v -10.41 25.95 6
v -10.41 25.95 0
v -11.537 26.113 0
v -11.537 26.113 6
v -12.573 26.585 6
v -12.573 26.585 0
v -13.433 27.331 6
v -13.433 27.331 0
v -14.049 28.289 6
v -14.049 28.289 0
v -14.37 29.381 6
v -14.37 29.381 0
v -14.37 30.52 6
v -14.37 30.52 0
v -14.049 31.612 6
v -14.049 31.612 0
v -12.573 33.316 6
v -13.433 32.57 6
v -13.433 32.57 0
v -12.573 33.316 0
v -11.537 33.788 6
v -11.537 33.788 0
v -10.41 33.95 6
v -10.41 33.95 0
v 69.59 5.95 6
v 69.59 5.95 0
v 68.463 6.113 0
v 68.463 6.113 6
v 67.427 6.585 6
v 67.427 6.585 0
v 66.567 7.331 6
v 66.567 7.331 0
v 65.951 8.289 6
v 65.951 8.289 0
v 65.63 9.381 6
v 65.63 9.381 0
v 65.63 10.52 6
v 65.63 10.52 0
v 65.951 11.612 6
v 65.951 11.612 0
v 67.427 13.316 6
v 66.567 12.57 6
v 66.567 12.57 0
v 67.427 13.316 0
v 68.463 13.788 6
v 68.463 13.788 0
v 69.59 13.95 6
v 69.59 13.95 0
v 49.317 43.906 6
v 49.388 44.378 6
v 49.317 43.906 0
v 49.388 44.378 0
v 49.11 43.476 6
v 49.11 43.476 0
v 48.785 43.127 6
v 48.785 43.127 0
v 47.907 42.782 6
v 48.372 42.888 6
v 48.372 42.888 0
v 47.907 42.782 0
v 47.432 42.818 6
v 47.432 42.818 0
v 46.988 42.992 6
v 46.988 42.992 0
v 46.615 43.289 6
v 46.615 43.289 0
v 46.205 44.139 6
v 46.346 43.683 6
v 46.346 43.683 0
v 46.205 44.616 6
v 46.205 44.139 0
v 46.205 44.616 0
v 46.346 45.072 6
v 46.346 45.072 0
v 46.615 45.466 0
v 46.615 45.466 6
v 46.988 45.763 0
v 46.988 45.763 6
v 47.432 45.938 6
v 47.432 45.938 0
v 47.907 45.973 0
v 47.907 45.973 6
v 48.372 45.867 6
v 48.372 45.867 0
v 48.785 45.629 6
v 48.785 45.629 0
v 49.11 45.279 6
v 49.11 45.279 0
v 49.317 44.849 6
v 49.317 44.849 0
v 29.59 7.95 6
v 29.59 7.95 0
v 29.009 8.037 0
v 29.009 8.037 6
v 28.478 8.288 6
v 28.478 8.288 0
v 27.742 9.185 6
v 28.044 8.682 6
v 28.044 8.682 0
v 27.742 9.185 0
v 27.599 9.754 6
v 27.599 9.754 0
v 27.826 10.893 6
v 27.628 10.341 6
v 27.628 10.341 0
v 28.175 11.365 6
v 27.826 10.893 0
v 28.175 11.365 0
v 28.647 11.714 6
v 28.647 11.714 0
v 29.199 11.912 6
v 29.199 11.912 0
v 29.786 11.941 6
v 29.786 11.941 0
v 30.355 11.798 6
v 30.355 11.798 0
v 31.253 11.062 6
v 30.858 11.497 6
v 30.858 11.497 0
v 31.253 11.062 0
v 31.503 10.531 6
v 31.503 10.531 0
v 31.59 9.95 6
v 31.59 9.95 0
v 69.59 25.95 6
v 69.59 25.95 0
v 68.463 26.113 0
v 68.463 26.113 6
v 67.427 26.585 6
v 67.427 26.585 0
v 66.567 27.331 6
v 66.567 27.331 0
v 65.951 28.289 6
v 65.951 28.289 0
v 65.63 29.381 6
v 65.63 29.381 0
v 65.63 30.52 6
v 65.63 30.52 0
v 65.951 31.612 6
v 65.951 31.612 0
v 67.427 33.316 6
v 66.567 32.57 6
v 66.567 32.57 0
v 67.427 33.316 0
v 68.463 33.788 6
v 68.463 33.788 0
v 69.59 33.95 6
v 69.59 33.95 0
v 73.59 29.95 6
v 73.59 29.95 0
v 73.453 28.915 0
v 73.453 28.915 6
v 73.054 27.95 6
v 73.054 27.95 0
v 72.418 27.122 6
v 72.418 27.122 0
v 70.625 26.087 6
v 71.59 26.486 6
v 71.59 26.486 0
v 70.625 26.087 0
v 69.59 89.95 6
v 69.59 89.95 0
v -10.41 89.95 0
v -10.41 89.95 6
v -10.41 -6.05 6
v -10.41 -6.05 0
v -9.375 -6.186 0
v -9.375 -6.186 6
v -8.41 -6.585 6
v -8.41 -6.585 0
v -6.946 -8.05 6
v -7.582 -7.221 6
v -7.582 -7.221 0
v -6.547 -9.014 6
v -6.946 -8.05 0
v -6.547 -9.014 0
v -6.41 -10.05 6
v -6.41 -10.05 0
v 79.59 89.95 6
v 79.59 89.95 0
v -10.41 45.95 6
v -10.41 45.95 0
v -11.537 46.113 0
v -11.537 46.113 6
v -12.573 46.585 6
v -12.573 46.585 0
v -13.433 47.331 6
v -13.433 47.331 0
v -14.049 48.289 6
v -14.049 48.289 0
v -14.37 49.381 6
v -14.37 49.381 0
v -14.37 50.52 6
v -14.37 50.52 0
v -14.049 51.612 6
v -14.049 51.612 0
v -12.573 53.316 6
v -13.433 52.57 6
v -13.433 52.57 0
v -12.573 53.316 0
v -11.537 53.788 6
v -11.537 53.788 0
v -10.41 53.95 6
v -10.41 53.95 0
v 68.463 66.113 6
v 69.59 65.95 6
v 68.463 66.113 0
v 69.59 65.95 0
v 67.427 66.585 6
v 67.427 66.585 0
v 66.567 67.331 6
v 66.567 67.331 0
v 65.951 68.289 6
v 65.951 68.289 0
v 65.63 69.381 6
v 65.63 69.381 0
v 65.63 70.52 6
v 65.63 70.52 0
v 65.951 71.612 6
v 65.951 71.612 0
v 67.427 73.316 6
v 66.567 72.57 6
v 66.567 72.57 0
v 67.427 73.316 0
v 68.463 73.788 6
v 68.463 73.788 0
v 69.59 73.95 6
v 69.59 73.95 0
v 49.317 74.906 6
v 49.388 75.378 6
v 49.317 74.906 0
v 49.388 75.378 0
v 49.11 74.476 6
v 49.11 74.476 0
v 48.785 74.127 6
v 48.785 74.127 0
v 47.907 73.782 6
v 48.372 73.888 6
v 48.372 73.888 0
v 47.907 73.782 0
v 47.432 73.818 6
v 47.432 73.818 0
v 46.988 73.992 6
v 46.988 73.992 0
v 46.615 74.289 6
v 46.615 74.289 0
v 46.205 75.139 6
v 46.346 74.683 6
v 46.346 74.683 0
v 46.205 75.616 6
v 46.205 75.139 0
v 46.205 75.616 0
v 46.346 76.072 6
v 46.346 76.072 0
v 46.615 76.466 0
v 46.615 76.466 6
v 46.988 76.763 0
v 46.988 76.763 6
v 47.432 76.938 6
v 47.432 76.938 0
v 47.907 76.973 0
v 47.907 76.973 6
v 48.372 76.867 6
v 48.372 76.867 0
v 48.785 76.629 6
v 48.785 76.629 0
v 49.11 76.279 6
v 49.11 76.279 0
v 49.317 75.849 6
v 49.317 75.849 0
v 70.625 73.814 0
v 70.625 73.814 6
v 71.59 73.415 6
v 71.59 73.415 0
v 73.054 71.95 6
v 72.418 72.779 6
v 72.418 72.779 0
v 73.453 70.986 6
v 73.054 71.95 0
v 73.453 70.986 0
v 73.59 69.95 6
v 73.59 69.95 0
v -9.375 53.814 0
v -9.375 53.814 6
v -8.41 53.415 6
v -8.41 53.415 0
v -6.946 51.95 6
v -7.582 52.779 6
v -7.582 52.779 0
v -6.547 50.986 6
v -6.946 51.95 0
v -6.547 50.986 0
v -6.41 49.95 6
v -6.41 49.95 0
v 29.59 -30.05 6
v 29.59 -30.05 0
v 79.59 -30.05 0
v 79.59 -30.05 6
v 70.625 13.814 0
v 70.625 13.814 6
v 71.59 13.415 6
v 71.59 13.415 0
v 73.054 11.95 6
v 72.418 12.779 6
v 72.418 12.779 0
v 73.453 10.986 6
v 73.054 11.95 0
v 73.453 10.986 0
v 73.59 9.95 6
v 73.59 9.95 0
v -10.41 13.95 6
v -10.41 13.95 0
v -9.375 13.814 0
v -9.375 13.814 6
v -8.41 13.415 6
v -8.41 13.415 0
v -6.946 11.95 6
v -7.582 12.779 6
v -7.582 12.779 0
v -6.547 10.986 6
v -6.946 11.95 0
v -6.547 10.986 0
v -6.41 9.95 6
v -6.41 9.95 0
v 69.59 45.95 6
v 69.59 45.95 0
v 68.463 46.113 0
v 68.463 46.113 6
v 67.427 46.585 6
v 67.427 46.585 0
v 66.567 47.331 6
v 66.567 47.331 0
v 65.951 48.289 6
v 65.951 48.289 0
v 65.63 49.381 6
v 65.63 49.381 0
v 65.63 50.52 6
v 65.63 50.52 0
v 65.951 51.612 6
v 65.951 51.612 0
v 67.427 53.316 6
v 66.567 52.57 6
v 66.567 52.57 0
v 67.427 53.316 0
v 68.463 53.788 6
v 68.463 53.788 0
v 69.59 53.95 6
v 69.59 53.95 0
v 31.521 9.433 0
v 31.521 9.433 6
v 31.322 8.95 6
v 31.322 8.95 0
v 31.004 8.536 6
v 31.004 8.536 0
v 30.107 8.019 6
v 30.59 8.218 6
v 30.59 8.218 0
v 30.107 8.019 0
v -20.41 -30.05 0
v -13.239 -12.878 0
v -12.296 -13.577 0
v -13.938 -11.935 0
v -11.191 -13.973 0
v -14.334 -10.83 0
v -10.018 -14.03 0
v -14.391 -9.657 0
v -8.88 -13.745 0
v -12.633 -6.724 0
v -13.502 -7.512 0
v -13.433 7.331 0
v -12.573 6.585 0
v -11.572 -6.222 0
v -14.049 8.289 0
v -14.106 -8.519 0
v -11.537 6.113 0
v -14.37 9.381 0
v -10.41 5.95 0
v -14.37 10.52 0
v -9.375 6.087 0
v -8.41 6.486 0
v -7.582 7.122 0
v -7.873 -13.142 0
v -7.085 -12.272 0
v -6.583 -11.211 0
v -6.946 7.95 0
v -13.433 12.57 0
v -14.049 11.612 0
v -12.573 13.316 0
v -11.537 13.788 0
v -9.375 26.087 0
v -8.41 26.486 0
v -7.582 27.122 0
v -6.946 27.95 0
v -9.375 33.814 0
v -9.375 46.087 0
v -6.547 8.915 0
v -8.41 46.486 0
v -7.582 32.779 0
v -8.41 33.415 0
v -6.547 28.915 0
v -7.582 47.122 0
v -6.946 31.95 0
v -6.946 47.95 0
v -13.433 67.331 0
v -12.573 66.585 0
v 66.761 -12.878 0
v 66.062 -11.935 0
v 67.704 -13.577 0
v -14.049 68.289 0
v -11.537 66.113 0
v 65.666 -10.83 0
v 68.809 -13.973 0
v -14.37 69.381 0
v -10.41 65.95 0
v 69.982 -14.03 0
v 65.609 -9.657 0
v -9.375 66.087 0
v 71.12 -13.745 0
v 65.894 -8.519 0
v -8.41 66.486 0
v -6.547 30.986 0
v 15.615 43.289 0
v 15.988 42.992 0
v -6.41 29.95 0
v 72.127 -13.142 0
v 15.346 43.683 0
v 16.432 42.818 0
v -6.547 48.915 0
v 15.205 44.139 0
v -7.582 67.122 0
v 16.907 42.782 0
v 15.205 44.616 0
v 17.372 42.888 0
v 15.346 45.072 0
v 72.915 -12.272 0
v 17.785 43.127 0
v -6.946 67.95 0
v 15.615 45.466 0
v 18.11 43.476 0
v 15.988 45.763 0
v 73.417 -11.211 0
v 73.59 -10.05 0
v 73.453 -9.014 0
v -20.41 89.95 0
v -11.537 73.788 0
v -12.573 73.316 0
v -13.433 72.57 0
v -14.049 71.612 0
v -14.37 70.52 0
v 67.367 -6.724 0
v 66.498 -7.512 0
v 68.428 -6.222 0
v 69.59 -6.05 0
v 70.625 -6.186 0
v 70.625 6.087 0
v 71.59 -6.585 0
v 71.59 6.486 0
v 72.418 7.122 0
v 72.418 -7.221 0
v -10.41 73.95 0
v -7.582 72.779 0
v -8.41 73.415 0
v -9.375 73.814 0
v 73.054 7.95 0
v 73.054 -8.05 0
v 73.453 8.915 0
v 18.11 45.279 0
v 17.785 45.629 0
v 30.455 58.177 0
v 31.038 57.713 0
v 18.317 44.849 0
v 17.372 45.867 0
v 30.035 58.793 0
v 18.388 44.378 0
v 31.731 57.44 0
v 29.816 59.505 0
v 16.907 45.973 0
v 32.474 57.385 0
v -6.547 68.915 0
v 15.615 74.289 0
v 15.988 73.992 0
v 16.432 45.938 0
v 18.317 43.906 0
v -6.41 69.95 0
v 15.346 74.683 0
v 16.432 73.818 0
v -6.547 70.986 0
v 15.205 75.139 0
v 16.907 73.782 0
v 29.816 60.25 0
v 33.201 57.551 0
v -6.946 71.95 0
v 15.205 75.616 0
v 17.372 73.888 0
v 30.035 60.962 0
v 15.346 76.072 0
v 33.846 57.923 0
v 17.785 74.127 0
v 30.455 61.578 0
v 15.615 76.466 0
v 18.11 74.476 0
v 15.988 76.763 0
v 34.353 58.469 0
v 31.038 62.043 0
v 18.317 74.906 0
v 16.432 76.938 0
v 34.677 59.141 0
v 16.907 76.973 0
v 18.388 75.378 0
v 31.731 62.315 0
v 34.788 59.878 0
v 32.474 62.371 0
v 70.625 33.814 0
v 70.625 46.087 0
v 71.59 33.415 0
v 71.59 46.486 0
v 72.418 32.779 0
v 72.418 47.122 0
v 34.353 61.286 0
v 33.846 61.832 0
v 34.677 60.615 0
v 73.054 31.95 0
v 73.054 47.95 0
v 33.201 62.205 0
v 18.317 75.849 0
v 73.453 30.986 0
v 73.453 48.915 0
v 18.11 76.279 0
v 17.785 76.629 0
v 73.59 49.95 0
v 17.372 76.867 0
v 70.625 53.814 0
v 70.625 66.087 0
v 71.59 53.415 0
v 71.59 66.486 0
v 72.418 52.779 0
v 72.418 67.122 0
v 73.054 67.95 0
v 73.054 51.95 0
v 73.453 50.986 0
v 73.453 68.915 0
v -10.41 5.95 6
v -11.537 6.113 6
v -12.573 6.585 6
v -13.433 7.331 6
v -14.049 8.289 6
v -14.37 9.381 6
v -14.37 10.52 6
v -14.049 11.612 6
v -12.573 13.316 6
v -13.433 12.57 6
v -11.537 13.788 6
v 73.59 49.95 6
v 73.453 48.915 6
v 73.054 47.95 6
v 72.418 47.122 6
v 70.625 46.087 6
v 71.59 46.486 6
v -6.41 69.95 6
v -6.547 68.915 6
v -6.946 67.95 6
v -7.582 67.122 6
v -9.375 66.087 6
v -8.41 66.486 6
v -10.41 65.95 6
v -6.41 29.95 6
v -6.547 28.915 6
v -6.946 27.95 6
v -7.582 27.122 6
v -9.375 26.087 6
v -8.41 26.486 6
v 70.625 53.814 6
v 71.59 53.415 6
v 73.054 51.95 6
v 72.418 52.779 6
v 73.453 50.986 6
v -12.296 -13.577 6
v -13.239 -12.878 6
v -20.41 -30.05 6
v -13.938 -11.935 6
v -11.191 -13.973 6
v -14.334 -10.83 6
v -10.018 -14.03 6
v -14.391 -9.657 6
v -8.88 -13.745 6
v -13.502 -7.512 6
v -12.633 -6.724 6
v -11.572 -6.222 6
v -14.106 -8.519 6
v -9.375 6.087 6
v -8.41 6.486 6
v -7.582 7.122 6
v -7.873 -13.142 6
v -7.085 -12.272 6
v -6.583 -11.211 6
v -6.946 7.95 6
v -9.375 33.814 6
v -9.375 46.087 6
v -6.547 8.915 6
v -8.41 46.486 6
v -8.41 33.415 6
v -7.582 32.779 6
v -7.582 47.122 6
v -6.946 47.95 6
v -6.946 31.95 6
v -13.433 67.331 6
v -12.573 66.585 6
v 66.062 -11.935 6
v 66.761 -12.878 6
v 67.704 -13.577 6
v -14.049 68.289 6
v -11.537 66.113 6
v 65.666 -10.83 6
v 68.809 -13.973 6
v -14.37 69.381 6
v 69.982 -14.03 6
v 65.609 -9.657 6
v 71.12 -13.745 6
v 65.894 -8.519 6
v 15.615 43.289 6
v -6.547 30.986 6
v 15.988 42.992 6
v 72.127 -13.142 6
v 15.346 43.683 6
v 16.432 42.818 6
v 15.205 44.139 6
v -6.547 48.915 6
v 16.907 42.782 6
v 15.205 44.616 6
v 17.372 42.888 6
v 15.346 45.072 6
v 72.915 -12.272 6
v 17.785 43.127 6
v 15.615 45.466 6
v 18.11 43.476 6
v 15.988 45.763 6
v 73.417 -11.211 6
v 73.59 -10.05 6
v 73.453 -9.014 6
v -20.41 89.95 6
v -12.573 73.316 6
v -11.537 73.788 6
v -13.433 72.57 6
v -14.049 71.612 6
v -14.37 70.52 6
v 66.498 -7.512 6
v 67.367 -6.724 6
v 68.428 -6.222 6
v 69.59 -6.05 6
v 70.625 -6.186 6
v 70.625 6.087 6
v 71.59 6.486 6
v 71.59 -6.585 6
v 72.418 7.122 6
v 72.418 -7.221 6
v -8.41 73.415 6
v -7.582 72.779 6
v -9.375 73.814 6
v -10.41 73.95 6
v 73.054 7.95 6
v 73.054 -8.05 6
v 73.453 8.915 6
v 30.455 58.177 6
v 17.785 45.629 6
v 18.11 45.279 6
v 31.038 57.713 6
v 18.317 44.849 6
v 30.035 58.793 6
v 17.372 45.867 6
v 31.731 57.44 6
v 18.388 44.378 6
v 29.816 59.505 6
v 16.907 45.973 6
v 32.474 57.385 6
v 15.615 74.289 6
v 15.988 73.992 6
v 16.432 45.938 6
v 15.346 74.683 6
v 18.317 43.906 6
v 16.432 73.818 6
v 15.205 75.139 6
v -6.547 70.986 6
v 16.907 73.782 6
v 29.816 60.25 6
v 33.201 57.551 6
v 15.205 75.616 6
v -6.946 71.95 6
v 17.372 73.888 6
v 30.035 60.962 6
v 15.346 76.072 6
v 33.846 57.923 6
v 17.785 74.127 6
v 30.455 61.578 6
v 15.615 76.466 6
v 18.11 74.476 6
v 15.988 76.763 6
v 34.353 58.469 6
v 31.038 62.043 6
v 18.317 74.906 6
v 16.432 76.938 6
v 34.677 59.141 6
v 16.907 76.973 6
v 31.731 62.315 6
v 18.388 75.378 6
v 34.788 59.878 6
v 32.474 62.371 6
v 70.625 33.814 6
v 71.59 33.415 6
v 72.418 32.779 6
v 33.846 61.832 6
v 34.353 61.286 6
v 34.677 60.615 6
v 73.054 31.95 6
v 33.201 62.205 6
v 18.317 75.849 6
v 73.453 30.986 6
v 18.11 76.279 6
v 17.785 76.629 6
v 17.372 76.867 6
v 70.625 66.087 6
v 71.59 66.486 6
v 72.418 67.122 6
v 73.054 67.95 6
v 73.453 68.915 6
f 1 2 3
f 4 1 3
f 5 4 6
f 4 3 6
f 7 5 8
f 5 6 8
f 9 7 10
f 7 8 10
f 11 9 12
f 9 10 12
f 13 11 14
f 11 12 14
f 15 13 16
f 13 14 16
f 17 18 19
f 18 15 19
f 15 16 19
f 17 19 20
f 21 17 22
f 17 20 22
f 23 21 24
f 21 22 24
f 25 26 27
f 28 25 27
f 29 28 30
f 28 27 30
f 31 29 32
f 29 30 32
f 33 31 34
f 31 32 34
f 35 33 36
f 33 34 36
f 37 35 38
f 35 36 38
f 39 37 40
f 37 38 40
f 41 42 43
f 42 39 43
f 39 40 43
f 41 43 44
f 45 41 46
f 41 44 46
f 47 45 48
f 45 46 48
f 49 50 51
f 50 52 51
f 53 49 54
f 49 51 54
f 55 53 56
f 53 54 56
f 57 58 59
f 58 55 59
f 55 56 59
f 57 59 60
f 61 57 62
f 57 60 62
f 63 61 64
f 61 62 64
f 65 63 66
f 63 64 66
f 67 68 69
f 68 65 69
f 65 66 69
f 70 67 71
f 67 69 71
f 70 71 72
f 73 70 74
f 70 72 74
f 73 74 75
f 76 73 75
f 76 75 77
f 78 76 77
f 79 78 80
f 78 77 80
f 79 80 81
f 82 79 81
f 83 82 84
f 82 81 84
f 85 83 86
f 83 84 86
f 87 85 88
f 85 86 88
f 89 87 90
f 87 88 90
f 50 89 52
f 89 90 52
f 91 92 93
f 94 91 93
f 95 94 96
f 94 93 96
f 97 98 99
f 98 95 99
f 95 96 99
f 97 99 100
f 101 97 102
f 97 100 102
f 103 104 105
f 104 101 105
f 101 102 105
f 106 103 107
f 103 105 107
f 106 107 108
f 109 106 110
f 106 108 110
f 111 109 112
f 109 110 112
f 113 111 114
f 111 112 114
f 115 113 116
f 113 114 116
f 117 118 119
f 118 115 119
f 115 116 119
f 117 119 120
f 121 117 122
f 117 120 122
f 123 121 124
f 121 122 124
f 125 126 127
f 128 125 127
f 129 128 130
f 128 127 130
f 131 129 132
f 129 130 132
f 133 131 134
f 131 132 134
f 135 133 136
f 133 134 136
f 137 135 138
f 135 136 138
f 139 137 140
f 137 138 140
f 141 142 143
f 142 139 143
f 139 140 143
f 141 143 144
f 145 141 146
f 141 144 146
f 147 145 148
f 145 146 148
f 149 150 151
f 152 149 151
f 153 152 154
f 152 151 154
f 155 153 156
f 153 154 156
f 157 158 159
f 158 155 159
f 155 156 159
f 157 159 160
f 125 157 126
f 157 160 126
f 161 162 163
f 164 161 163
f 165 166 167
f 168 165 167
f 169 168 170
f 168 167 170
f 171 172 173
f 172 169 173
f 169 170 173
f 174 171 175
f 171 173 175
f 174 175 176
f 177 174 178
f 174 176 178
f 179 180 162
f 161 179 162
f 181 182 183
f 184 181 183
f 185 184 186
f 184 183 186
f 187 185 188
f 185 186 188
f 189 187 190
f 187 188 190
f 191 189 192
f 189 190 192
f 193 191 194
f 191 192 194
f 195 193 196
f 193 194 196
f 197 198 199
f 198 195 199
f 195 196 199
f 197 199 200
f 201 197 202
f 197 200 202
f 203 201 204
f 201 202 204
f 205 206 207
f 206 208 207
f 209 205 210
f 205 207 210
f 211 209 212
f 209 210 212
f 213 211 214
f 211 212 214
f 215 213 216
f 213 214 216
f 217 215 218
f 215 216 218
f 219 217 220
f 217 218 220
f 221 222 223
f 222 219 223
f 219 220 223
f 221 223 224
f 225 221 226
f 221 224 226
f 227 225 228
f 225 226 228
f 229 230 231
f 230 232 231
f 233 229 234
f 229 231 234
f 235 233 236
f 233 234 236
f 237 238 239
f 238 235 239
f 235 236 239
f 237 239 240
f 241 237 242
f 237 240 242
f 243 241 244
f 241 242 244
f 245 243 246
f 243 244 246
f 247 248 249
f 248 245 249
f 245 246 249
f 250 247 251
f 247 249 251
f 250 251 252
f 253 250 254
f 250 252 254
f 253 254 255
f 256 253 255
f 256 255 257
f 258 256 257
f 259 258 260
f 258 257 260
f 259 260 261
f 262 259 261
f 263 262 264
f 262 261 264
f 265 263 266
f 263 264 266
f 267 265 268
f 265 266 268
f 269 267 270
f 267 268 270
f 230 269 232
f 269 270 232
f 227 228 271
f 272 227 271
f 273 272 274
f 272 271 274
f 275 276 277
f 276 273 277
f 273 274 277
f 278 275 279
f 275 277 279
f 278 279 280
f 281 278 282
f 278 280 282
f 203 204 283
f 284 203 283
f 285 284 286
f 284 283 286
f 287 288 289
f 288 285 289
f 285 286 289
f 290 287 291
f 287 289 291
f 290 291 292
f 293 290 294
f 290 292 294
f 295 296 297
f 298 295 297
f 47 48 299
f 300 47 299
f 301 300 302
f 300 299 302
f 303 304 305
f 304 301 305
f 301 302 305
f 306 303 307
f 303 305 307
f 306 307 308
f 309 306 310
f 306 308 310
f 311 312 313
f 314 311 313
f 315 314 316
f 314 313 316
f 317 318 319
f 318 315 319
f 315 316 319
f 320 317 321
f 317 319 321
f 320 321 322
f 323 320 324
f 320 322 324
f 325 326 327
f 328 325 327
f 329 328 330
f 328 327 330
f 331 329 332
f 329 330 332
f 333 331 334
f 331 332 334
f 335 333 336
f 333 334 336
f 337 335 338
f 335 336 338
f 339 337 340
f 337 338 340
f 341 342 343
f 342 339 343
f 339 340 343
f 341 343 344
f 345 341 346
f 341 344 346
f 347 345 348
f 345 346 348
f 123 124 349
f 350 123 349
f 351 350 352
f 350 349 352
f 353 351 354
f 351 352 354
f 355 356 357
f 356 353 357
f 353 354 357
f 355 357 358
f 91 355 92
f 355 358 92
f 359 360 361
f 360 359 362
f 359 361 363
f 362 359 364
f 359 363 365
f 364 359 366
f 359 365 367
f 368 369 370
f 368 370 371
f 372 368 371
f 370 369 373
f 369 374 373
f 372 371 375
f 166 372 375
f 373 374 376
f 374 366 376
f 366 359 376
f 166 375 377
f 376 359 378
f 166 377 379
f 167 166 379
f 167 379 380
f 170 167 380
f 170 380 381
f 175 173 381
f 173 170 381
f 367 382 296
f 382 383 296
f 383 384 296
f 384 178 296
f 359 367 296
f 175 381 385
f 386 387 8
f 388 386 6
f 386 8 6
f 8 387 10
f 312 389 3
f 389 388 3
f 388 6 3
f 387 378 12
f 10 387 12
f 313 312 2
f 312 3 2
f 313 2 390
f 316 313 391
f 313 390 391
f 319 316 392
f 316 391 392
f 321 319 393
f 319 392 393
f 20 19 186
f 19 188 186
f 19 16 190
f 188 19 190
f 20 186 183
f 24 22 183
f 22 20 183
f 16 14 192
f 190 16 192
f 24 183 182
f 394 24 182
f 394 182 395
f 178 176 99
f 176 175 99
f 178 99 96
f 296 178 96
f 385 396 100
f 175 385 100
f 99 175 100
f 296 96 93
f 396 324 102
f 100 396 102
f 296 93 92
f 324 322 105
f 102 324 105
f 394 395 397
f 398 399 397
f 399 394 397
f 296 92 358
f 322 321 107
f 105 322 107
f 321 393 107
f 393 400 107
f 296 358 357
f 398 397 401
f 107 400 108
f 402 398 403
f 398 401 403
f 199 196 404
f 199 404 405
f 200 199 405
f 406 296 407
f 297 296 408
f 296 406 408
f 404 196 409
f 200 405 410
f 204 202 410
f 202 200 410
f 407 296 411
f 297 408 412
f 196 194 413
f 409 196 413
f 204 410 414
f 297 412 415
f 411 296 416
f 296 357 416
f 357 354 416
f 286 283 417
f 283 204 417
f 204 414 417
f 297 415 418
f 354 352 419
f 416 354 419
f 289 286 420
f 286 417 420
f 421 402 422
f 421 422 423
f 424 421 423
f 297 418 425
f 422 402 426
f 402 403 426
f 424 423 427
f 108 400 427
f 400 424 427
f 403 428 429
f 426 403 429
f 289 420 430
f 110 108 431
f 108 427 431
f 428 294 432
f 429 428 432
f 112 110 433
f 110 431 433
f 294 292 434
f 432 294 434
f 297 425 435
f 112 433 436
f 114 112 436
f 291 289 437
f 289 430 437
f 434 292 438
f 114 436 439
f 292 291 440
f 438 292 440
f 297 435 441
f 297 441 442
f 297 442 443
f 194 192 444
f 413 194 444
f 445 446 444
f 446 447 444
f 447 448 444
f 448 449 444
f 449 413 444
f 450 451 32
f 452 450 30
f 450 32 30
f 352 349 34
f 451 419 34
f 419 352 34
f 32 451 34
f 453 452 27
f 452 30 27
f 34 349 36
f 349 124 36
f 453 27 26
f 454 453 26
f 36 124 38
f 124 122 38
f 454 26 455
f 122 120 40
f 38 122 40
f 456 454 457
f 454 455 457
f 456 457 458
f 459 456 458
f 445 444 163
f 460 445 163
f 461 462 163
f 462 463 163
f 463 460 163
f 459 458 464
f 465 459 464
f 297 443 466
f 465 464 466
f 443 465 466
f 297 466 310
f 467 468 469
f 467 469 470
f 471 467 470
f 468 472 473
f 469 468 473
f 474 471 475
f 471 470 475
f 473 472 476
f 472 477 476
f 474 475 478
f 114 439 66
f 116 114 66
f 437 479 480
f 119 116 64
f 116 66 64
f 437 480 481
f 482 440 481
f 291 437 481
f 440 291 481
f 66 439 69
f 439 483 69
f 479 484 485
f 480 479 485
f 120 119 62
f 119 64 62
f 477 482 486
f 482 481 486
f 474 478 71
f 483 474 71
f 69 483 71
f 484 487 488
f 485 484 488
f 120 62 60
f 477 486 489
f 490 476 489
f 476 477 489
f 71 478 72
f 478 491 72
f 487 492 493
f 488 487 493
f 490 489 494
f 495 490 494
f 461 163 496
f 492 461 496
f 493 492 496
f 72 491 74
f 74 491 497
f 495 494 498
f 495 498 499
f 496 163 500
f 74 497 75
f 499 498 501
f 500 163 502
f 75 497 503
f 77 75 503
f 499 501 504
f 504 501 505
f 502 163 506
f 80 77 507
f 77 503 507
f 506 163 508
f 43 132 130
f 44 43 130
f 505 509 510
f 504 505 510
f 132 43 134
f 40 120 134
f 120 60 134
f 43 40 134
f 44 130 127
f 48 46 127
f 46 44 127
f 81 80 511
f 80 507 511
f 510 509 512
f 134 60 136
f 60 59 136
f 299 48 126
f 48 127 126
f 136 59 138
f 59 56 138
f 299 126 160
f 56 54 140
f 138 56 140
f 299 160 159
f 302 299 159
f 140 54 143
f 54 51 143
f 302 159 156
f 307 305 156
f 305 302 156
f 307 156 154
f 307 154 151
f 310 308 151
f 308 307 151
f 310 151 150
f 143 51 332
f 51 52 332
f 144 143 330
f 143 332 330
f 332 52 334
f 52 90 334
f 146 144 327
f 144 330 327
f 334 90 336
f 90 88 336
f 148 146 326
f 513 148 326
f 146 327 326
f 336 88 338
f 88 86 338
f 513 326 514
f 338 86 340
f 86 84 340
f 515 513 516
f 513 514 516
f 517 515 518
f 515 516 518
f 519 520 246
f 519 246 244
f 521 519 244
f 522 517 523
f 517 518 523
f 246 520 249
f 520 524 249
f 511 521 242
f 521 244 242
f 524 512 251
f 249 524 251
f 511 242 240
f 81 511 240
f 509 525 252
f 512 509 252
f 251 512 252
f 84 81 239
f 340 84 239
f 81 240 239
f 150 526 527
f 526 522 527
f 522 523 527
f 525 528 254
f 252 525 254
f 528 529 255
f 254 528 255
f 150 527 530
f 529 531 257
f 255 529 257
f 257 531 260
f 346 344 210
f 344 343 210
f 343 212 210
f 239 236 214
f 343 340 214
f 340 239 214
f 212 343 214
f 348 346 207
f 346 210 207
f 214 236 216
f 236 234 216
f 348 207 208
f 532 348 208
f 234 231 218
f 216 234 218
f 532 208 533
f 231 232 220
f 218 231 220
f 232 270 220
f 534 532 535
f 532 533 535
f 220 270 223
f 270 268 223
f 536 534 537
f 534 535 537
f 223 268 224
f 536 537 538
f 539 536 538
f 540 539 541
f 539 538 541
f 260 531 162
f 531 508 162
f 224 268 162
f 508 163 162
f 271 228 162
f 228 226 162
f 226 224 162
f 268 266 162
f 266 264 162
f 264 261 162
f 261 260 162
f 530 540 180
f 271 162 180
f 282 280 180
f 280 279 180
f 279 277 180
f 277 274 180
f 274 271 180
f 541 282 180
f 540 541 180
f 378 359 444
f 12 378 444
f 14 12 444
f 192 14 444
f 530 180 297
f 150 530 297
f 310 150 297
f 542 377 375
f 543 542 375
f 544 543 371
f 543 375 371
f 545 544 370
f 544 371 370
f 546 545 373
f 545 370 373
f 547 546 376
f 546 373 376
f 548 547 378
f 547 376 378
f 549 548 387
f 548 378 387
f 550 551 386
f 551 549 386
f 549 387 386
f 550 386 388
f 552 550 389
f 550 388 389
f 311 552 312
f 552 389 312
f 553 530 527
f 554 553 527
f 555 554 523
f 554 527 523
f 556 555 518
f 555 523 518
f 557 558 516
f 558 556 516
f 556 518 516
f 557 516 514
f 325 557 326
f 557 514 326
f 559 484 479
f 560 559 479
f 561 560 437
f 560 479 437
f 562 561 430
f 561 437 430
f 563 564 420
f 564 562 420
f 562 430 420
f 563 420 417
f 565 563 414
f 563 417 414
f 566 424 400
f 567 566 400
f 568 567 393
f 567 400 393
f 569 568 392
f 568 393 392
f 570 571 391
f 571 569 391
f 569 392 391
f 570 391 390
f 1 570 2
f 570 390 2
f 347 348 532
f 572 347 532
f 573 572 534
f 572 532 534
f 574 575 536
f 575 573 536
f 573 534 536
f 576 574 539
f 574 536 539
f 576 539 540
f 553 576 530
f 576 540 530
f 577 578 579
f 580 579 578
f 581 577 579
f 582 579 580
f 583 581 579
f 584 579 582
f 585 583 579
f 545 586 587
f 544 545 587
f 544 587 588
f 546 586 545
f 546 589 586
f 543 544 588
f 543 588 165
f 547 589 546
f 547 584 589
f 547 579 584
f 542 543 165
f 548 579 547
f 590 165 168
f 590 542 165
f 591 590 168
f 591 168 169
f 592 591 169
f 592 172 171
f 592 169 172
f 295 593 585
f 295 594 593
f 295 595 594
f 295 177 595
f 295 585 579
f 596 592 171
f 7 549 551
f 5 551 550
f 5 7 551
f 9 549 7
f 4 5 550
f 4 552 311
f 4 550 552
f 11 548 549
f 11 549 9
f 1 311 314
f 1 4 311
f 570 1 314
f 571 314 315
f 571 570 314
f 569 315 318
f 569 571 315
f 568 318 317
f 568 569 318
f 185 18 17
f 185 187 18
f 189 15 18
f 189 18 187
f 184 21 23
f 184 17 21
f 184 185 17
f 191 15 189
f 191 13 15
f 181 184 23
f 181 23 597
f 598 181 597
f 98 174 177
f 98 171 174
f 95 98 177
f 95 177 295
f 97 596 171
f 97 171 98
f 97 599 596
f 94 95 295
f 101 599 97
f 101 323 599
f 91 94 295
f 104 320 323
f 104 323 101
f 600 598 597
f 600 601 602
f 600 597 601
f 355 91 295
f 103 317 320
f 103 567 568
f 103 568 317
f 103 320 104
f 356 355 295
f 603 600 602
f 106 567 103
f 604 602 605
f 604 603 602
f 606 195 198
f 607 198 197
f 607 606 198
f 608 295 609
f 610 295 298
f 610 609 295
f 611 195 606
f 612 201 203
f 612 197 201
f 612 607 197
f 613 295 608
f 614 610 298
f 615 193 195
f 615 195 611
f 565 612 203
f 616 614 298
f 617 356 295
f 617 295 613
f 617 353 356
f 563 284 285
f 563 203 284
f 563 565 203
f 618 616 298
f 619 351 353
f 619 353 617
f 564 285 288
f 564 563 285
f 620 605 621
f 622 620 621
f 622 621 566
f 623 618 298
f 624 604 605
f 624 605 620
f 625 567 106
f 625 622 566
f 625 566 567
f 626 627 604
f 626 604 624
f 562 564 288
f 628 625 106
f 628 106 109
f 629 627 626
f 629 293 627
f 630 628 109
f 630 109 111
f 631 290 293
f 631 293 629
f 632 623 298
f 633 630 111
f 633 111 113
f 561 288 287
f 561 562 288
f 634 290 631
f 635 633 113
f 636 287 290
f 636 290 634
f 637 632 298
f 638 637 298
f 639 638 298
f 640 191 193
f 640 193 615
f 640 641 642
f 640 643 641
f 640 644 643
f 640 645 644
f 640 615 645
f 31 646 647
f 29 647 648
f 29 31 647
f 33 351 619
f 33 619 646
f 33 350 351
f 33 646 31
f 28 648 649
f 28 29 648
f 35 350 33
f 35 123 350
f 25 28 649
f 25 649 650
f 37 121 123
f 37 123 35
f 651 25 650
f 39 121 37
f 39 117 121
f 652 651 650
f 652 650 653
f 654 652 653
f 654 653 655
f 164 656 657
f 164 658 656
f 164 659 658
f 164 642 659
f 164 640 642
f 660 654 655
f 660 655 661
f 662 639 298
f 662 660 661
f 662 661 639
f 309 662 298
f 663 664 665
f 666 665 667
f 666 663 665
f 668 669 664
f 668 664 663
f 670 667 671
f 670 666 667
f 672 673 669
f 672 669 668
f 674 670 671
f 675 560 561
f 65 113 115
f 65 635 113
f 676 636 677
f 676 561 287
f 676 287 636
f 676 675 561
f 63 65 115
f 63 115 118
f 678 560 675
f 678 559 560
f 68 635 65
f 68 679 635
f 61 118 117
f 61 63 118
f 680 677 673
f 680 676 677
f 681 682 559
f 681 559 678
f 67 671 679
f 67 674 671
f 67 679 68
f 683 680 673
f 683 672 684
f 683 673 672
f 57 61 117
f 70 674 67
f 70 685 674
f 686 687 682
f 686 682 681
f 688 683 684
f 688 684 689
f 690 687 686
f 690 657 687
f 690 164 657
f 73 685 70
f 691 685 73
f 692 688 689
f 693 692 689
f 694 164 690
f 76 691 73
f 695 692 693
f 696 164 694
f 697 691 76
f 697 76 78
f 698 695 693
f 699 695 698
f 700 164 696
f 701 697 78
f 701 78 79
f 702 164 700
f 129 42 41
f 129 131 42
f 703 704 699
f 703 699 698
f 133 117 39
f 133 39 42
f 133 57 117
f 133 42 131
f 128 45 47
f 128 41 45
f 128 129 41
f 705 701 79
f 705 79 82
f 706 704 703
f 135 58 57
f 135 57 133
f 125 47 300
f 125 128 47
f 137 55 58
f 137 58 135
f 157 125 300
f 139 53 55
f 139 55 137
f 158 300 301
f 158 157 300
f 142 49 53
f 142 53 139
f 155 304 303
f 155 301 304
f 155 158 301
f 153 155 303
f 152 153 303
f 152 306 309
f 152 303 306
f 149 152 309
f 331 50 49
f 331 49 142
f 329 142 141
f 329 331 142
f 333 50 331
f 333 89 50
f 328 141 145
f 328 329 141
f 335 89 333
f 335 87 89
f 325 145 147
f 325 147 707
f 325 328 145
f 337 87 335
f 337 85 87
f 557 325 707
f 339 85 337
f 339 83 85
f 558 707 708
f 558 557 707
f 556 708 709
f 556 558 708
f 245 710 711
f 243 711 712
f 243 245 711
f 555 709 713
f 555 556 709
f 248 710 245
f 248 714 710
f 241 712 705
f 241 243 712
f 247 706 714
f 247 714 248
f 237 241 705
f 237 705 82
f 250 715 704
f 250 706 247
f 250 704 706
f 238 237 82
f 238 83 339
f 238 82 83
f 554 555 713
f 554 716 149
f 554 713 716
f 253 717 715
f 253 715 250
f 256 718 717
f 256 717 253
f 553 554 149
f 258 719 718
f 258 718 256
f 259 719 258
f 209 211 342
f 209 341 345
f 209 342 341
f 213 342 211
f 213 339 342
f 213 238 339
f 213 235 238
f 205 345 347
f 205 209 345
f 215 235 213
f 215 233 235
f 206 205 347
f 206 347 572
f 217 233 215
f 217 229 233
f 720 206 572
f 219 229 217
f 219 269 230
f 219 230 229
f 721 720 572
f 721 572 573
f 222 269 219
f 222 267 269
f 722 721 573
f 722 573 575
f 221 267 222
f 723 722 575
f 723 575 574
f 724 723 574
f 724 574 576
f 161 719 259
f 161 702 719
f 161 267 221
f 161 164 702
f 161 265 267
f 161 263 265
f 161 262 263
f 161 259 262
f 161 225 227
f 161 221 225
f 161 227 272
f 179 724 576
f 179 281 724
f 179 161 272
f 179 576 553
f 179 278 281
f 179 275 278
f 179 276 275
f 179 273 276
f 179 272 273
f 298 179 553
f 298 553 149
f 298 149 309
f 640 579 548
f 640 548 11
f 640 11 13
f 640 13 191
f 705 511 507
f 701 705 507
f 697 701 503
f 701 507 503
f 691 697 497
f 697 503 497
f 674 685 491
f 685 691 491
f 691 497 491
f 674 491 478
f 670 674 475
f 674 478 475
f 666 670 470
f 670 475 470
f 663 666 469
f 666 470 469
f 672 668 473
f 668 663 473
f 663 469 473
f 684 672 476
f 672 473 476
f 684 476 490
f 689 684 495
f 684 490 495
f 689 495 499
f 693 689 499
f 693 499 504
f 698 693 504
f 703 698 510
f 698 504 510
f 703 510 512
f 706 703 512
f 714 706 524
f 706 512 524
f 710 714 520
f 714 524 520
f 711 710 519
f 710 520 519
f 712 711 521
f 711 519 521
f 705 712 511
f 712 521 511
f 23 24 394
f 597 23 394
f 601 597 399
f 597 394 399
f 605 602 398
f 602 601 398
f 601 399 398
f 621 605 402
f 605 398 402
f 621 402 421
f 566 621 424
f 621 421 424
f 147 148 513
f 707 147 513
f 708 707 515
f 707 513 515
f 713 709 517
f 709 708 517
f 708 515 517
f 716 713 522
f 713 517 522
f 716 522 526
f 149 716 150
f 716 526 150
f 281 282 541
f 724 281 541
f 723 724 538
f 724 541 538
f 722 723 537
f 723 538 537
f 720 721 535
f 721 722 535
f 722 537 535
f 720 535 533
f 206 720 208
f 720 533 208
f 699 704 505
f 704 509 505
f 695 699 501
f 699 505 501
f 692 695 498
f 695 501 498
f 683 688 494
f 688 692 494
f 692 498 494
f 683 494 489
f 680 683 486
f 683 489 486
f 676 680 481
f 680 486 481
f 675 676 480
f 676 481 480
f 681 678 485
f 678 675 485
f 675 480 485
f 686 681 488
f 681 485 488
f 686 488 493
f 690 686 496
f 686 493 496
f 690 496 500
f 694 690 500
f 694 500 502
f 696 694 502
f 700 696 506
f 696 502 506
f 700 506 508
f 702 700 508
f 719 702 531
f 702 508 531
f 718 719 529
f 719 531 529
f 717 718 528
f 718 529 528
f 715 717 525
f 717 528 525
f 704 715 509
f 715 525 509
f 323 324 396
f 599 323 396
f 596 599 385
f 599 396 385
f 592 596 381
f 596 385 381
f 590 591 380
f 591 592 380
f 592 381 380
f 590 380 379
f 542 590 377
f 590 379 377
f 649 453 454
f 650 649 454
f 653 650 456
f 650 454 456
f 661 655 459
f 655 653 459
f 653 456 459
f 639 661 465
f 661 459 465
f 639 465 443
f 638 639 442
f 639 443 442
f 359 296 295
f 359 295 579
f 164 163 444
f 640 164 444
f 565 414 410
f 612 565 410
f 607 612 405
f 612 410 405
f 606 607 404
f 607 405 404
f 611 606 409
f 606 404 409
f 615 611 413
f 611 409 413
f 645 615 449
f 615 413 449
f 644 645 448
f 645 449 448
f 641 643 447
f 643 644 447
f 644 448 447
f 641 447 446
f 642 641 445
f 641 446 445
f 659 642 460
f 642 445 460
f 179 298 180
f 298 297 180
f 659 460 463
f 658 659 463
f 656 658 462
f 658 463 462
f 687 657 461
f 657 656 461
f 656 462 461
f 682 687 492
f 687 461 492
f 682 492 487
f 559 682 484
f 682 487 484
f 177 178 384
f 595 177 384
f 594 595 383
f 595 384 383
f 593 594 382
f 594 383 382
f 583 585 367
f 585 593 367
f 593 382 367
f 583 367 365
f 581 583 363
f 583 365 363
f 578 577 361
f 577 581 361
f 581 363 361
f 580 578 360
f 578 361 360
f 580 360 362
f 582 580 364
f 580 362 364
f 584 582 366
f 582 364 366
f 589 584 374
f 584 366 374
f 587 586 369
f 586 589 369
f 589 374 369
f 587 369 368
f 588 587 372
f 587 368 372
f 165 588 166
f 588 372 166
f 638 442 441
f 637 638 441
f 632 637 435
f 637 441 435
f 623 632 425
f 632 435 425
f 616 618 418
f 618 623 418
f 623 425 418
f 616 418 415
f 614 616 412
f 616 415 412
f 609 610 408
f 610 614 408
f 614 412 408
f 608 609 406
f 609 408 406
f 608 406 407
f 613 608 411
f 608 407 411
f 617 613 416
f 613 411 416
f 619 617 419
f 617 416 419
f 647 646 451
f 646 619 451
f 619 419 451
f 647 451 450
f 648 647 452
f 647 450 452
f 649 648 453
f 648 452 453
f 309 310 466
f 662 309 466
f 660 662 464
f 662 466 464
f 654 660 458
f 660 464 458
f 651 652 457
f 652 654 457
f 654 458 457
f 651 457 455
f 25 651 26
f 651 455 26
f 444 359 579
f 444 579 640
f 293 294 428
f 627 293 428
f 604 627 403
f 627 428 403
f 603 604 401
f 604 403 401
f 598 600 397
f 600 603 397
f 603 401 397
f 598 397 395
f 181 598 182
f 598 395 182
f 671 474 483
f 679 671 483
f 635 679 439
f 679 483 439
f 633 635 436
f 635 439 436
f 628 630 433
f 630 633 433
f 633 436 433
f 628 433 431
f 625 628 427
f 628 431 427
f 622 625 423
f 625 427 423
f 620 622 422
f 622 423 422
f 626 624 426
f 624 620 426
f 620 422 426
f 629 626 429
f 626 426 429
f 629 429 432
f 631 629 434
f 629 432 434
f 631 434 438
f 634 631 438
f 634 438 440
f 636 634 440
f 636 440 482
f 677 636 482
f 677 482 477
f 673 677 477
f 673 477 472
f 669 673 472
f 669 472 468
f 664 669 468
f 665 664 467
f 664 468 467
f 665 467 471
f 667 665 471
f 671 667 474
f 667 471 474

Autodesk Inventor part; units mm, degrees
ref_plane "YZ Plane" through (0, 0, 0) normal (1, 0, 0) x (0, 1, 0)
ref_plane "XZ Plane" through (0, 0, 0) normal (0, 1, 0) x (-1, 0, 0)
ref_plane "XY Plane" through (0, 0, 0) normal (0, 0, 1) x (1, 0, 0)
ref_plane "Work Plane1" through (0, 0, 0) normal (0, 0, 1) x (1, 0, 0)
sketch "Sketch1" plane through (0, 0, 0) normal (0, 0, 1) x (1, 0, 0)
  circle A0 centre (29.5896, 9.9505) radius 2
  circle A1 centre (32.2876, 59.8777) radius 2.5
  line L0 (29.5896, 9.9505) -> (29.5896, -30.0495)
  line L1 (29.5896, -30.0495) -> (79.5896, -30.0495)
  line L2 (79.5896, -30.0495) -> (79.5896, 89.9505)
  line L3 (79.5896, 89.9505) -> (-20.4104, 89.9505)
  line L4 (-20.4104, 89.9505) -> (79.5896, 89.9505)
  line L5 (79.5896, 89.9505) -> (79.5896, -30.0495)
  line L6 (79.5896, -30.0495) -> (-20.4104, -30.0495)
  line L7 (-20.4104, -30.0495) -> (-20.4104, 89.9505)
  circle A2 centre (16.7876, 75.3777) radius 1.6
  circle A3 centre (47.7876, 75.3777) radius 1.6
  circle A4 centre (47.7876, 44.3777) radius 1.6
  circle A5 centre (16.7876, 44.3777) radius 1.6
  line L8 (-20.4104, 89.9505) -> (-10.4104, 89.9505)
  line L9 (-10.4104, 89.9505) -> (-10.4104, 69.9505)
  line L10 (-10.4104, 69.9505) -> (-10.4104, 49.9505)
  line L11 (-10.4104, 49.9505) -> (-10.4104, 29.9505)
  line L12 (-10.4104, 29.9505) -> (-10.4104, 9.9505)
  line L13 (-10.4104, 9.9505) -> (-10.4104, -10.0495)
  line L14 (79.5896, 89.9505) -> (69.5896, 89.9505)
  line L15 (69.5896, 89.9505) -> (69.5896, 69.9505)
  line L16 (69.5896, 69.9505) -> (69.5896, 49.9505)
  line L17 (69.5896, 49.9505) -> (69.5896, 29.9505)
  line L18 (69.5896, 29.9505) -> (69.5896, 9.9505)
  line L19 (69.5896, 9.9505) -> (69.5896, -10.0495)
  circle A6 centre (-10.4104, 69.9505) radius 4
  circle A7 centre (-10.4104, 49.9505) radius 4
  circle A8 centre (-10.4104, 29.9505) radius 4
  circle A9 centre (-10.4104, 9.9505) radius 4
  circle A10 centre (-10.4104, -10.0495) radius 4
  circle A11 centre (69.5896, 69.9505) radius 4
  circle A12 centre (69.5896, 49.9505) radius 4
  circle A13 centre (69.5896, 29.9505) radius 4
  circle A14 centre (69.5896, 9.9505) radius 4
  circle A15 centre (69.5896, -10.0495) radius 4
  dimension "d0" = 4
  dimension "d1" = 5
  dimension "d2" = 40
  dimension "d3" = 50
  dimension "d4" = 120
  dimension "d5" = 100
  dimension "d6" = 3.2
  dimension "d7" = 3.2
  dimension "d8" = 3.2
  dimension "d9" = 3.2
  dimension "d10" = 10
  dimension "d11" = 20
  dimension "d12" = 20
  dimension "d13" = 20
  dimension "d14" = 20
  dimension "d15" = 20
  dimension "d16" = 10
  dimension "d17" = 20
  dimension "d18" = 20
  dimension "d19" = 20
  dimension "d20" = 20
  dimension "d21" = 20
  dimension "d22" = 8
  dimension "d23" = 8
  dimension "d24" = 8
  dimension "d25" = 8
  dimension "d26" = 8
  dimension "d27" = 8
  dimension "d28" = 8
  dimension "d29" = 8
  dimension "d30" = 8
  dimension "d31" = 8
extrude "Extrusion1" add sketch "Sketch1" along normal blind 6
properties part number "motor_gear_holder"
